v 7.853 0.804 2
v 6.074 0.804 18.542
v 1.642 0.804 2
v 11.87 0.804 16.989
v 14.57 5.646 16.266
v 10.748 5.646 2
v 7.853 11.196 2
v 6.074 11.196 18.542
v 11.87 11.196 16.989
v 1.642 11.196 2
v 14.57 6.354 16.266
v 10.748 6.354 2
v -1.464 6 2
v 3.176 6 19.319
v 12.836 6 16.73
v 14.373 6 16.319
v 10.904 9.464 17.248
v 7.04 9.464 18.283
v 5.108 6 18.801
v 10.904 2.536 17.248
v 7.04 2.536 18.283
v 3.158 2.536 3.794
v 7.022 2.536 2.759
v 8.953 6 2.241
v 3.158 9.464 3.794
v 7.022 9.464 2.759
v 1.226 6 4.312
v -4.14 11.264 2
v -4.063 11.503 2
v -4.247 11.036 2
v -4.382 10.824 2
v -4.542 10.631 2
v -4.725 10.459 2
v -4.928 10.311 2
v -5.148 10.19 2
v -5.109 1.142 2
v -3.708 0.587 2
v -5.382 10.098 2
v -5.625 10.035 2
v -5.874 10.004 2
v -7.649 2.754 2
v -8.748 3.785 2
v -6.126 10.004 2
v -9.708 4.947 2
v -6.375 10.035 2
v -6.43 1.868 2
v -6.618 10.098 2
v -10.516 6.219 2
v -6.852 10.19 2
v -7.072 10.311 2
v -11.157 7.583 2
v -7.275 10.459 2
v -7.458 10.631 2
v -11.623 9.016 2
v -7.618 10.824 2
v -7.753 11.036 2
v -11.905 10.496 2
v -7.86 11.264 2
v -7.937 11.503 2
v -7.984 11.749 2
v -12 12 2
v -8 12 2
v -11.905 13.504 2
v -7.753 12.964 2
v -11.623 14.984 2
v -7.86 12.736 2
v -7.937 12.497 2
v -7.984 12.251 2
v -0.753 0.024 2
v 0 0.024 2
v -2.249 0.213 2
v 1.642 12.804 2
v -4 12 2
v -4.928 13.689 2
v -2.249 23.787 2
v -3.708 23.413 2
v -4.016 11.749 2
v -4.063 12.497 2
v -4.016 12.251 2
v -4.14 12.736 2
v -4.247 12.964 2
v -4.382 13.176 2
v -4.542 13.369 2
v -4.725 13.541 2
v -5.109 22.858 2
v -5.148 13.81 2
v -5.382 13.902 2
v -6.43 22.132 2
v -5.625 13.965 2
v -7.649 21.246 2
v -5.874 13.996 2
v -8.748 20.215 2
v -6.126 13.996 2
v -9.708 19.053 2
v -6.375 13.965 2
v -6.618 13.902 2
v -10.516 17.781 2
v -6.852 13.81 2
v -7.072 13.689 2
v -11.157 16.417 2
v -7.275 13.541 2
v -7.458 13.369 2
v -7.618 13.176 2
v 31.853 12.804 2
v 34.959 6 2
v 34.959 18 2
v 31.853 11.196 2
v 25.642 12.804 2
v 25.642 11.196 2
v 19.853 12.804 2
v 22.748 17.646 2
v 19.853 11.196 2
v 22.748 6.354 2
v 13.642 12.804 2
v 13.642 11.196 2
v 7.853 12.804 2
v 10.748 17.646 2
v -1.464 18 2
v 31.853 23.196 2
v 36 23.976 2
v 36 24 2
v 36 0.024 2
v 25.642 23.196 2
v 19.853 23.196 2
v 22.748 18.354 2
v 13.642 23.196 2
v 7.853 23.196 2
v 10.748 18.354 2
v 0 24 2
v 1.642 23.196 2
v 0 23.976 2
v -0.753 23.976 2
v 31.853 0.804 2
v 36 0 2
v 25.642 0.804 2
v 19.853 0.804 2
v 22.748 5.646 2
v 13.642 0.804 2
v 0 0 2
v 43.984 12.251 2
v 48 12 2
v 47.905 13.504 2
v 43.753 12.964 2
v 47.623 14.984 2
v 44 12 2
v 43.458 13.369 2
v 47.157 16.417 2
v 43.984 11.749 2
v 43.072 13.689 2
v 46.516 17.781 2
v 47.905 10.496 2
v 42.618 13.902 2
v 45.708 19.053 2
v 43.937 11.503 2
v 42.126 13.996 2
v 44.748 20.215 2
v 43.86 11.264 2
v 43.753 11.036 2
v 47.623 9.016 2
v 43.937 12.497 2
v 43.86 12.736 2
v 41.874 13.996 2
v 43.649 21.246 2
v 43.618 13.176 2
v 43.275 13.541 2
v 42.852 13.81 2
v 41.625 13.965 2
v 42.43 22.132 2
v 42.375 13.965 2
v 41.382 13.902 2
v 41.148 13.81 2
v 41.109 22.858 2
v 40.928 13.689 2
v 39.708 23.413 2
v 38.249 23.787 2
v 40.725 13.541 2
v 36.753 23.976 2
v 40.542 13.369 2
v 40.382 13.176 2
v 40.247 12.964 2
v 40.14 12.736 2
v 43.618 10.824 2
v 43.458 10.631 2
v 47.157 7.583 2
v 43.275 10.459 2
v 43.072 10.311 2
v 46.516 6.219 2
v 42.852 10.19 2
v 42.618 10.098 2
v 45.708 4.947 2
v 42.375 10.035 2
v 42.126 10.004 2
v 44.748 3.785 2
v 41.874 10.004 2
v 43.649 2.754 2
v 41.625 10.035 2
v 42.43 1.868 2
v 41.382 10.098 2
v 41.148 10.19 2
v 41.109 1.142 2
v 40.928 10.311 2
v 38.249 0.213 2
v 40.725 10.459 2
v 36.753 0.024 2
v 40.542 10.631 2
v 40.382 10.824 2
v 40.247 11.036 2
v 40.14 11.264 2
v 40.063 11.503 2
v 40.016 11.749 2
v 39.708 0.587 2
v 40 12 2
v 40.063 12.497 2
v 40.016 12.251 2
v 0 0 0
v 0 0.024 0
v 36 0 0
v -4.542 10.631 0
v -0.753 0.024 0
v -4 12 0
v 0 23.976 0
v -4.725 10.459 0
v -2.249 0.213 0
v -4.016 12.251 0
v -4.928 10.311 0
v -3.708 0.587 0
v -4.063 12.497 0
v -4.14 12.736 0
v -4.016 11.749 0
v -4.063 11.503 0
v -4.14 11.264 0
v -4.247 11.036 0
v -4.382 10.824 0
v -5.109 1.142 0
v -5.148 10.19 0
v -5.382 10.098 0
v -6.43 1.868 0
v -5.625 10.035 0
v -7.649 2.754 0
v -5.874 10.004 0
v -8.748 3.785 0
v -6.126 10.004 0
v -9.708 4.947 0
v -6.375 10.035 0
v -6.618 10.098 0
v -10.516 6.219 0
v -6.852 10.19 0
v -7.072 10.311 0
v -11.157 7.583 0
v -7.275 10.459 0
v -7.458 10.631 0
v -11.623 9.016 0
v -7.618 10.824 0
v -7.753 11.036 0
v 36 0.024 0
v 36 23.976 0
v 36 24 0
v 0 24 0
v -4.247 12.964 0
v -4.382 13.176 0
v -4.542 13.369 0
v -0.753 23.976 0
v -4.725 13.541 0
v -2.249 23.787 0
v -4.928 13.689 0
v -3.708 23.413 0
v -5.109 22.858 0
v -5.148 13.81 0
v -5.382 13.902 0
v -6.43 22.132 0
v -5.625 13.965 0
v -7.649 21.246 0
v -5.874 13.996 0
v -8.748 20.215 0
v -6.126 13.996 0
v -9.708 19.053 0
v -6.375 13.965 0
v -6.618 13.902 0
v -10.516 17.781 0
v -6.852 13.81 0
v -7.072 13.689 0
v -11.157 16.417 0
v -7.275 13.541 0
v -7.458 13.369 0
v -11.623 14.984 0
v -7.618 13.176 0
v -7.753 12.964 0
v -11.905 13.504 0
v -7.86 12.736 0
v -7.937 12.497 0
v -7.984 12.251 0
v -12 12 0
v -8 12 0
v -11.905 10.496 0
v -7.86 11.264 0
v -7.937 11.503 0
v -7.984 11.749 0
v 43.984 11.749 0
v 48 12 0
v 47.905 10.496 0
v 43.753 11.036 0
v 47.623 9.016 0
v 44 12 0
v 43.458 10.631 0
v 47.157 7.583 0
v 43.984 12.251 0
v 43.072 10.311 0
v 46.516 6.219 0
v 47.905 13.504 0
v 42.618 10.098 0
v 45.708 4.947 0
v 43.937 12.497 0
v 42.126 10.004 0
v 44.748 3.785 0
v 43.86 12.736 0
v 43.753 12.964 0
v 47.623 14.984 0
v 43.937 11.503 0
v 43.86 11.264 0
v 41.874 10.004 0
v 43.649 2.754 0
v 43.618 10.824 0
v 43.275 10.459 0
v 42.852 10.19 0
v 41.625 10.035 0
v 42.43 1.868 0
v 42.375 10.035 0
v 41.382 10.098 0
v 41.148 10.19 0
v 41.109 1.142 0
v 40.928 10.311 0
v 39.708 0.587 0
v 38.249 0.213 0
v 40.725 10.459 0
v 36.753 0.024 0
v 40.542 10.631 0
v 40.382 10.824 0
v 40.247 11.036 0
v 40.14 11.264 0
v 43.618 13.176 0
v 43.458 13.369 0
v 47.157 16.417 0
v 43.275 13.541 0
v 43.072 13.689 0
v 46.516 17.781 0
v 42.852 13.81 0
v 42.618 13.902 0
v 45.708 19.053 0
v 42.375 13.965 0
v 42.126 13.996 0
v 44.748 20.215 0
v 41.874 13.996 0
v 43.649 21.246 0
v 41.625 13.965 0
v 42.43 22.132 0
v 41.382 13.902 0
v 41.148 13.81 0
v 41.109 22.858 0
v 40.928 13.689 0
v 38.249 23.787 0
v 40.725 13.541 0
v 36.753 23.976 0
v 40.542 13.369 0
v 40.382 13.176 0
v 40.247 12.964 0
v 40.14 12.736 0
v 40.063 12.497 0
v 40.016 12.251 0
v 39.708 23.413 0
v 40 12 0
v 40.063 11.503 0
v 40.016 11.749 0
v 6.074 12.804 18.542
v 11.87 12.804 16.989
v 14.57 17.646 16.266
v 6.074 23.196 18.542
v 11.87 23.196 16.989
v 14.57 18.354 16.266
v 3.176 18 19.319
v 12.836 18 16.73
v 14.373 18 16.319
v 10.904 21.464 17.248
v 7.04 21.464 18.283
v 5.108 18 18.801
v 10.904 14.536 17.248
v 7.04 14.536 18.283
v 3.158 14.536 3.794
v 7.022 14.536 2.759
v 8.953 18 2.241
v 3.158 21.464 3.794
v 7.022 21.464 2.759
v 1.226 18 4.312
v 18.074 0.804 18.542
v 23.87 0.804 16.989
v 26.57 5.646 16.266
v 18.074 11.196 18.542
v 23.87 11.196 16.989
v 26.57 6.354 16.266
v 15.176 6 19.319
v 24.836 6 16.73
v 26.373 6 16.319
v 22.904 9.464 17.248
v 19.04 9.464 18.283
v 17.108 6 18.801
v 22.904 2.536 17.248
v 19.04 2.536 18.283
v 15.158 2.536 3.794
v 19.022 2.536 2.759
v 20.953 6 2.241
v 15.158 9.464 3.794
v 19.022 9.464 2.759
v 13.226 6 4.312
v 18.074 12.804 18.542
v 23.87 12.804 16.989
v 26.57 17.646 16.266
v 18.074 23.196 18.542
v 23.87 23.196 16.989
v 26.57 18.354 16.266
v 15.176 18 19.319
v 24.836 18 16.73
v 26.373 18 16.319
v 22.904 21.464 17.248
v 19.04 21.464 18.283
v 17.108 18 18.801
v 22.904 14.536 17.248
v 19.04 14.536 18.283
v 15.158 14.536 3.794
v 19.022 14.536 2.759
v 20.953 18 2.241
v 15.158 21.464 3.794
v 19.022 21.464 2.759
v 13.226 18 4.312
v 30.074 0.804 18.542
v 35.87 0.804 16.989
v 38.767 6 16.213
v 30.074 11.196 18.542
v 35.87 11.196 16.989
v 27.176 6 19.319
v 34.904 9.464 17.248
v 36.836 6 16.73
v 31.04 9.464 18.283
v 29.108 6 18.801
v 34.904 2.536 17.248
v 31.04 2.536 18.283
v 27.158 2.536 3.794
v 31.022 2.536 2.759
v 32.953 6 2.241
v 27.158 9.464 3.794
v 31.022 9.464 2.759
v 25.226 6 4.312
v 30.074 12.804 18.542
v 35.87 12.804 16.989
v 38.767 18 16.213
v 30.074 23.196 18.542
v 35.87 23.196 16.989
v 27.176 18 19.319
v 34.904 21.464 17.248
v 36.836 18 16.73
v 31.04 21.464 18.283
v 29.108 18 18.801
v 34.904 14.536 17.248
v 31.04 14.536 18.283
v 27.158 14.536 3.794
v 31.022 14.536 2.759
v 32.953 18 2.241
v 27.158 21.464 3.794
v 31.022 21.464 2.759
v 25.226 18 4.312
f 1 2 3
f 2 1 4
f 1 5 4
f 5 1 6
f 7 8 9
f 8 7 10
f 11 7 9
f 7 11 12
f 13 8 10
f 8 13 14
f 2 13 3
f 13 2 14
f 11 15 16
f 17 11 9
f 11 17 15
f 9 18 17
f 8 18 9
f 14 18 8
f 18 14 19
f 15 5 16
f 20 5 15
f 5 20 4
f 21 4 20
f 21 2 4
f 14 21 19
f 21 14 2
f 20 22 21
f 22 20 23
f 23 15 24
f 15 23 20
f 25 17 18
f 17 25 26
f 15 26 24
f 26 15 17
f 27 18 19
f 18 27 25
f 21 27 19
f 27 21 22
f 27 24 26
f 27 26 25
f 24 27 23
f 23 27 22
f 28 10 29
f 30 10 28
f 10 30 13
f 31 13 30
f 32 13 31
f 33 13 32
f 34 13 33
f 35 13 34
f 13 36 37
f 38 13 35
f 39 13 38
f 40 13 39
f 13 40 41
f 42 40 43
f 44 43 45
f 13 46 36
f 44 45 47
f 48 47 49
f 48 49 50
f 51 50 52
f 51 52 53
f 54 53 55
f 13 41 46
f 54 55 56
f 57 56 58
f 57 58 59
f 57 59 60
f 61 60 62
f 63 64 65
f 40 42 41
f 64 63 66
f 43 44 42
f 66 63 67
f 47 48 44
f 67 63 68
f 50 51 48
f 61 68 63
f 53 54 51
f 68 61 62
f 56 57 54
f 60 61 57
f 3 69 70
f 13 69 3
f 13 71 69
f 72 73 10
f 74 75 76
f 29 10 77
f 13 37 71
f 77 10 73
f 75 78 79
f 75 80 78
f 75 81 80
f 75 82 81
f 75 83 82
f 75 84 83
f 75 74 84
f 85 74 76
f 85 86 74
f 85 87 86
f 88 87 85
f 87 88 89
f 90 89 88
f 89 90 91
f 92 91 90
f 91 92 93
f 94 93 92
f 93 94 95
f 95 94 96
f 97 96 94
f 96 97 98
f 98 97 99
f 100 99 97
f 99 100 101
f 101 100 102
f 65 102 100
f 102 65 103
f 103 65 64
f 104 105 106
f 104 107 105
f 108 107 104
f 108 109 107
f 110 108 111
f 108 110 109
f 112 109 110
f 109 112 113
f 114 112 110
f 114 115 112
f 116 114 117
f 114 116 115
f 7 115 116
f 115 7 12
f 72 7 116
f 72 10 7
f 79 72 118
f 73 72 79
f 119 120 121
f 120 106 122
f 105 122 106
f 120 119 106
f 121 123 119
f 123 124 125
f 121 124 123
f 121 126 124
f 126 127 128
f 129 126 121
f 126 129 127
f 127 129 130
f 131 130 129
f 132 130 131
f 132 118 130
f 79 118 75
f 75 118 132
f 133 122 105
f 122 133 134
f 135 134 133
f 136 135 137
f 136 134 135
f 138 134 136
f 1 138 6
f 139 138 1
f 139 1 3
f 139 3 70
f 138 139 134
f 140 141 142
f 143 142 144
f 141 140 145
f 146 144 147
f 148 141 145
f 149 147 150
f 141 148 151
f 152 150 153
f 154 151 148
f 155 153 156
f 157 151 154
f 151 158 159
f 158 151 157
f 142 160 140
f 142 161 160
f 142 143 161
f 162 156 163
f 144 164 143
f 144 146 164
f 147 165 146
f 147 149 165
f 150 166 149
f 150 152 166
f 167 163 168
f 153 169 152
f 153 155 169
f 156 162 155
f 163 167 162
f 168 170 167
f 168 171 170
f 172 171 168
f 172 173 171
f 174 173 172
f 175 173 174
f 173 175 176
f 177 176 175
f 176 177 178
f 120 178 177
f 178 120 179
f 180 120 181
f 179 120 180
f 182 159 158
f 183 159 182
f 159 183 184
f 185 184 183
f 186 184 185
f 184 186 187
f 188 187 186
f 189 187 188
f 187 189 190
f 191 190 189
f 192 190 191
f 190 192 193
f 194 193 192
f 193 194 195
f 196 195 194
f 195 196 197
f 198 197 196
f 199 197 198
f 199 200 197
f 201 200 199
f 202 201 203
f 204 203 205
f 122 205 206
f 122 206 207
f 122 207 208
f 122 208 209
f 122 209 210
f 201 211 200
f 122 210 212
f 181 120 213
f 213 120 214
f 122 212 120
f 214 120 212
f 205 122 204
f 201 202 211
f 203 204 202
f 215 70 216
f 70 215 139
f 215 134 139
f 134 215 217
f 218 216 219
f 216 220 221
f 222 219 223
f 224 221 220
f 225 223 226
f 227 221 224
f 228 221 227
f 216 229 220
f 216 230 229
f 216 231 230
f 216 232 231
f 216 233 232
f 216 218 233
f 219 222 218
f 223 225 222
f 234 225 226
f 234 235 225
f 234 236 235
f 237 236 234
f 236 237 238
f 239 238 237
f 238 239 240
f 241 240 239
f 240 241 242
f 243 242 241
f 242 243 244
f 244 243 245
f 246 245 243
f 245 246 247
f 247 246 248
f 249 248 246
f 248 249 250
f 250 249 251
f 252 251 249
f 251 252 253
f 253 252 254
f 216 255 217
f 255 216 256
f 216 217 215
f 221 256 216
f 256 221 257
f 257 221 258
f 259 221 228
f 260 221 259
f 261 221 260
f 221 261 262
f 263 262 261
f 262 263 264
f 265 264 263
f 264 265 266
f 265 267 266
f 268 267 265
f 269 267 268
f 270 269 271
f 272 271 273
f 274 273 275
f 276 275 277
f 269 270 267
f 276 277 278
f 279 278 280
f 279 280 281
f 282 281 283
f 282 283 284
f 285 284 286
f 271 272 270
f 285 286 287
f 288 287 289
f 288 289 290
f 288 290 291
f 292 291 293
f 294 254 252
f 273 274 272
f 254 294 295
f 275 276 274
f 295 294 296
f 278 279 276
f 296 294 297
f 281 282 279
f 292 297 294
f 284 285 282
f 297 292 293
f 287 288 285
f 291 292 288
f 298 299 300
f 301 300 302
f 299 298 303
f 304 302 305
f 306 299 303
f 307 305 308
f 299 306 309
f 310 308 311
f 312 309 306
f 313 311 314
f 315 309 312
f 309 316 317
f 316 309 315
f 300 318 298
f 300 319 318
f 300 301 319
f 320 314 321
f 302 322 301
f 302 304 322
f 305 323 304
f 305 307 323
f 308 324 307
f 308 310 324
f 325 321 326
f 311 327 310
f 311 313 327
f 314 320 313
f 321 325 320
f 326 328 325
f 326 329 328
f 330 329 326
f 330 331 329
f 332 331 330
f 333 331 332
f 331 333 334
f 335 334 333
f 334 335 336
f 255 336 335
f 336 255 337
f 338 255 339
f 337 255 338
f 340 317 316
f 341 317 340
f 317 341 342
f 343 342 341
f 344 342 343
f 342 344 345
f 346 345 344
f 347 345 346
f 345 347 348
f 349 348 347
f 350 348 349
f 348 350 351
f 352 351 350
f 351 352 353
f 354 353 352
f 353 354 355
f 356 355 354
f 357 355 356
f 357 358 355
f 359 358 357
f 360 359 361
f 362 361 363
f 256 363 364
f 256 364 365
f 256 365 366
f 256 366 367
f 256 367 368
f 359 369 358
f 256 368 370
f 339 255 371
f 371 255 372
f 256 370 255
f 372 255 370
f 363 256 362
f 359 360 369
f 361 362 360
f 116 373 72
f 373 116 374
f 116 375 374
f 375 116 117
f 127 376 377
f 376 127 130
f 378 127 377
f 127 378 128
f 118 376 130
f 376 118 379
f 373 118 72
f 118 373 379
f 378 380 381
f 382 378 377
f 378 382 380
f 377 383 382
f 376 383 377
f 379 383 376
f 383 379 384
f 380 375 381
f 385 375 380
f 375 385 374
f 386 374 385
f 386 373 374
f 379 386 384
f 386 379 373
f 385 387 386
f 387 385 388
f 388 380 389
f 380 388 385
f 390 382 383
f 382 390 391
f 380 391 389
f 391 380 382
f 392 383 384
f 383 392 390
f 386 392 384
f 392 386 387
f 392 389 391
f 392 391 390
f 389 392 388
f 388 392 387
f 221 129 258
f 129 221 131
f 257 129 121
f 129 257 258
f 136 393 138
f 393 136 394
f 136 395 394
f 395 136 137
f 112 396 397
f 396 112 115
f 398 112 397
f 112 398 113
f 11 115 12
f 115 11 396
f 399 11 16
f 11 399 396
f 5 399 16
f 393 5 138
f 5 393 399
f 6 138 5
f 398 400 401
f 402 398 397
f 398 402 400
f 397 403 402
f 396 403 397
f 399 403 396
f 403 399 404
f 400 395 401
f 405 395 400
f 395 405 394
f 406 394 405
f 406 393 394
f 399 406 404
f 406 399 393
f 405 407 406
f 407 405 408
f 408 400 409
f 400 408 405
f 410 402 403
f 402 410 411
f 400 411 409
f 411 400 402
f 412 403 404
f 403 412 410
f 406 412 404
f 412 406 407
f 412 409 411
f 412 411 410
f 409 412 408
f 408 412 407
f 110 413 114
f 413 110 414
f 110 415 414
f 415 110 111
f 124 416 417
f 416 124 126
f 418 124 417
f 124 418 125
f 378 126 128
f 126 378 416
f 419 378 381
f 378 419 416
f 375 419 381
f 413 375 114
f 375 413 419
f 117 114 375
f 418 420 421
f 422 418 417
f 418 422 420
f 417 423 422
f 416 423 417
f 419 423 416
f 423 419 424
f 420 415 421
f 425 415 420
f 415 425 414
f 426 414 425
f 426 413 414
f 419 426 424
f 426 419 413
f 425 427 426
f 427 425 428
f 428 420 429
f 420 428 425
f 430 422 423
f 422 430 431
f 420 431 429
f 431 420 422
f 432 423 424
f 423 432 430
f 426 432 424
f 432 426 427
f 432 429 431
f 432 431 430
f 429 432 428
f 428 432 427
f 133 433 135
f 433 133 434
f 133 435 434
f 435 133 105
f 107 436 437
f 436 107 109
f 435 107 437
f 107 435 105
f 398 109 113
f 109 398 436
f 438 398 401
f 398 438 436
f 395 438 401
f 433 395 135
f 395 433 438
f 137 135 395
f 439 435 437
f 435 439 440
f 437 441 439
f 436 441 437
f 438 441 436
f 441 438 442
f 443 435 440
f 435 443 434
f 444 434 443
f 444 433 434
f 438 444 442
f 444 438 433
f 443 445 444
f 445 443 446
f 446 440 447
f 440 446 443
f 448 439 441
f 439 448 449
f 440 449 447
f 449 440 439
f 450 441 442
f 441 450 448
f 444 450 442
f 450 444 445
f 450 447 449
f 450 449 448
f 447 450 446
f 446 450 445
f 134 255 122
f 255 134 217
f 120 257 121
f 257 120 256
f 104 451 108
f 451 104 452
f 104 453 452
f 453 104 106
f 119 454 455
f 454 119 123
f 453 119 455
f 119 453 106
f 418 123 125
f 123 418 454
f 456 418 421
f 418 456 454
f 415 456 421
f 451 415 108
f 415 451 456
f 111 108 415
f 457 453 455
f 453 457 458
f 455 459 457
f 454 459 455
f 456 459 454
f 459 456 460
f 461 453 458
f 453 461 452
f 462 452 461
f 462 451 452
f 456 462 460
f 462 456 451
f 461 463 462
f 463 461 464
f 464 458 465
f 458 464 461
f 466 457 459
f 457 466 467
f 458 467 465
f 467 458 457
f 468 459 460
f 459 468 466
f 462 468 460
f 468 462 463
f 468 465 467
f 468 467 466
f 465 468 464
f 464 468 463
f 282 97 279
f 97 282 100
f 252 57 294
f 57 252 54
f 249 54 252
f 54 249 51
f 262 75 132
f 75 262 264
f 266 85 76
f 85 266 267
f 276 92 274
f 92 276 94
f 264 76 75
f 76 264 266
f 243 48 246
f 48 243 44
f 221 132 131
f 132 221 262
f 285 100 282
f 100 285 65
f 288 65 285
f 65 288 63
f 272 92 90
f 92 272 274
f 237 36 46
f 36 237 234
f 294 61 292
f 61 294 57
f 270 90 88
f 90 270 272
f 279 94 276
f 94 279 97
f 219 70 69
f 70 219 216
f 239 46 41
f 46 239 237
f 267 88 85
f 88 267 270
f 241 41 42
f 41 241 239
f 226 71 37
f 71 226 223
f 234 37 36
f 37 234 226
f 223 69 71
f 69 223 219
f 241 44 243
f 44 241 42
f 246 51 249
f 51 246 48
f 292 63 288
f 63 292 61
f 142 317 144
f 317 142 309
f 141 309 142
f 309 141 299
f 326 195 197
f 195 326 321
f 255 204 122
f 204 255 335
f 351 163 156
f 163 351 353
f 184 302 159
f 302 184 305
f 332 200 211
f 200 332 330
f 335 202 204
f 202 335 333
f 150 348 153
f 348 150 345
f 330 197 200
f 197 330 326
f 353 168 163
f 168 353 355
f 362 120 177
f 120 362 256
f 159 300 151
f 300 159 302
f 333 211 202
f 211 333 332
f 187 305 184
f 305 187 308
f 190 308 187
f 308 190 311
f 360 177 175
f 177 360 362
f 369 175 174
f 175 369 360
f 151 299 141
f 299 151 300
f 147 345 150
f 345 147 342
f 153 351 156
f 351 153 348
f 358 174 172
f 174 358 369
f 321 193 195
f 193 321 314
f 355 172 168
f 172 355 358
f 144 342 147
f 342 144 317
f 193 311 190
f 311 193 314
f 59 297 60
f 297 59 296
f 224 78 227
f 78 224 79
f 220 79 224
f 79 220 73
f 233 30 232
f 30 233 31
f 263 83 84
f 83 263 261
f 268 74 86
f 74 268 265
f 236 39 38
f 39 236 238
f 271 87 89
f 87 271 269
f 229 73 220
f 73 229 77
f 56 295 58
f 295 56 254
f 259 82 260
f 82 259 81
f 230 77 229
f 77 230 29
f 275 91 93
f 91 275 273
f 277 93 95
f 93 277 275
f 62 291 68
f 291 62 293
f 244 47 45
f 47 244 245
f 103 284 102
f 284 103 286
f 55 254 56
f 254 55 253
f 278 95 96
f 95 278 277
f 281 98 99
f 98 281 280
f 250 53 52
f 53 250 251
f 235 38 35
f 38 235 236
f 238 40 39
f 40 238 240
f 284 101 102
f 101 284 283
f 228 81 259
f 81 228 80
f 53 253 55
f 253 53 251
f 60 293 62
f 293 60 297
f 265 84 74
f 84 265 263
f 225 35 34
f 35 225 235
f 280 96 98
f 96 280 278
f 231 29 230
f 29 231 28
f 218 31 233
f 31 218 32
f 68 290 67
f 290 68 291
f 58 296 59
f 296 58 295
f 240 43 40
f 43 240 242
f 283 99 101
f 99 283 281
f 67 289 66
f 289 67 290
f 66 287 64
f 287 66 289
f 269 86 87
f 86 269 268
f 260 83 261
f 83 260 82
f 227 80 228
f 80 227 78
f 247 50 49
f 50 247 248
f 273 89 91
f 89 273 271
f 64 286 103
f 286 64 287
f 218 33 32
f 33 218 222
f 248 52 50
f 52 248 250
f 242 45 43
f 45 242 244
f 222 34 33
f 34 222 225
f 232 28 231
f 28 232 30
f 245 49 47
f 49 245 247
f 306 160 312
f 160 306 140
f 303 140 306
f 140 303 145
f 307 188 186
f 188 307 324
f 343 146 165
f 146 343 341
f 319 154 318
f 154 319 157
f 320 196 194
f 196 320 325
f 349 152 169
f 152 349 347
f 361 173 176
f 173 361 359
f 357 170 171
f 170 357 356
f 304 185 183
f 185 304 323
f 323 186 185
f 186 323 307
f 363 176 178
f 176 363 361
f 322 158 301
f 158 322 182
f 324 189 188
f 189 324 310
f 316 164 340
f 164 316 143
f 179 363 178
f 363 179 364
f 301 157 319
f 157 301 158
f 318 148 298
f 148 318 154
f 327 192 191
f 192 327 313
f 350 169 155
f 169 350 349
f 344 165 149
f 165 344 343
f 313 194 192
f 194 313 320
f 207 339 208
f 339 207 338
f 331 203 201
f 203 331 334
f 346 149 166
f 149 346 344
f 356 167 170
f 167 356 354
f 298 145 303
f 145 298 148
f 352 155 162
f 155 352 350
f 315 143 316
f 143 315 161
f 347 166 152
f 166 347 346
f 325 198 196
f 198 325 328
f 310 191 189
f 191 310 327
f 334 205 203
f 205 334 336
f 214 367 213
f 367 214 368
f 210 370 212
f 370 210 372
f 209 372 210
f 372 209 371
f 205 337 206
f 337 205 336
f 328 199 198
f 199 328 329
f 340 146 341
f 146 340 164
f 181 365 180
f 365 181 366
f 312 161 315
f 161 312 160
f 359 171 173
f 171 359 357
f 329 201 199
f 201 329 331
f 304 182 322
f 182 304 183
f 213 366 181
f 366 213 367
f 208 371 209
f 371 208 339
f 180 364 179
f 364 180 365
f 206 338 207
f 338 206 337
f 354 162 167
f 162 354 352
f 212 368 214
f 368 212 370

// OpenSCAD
d = 8;
dd = 2;
wall = 2 * 2;
h = 15;

module unit(){
    
    difference(){

        union(){
            translate( [ -2, 0, 0 ] )
                rotate( 15, [ 0, 1, 0 ] )
                    translate( [ d / 2 + dd, d / 2 + dd, 5 ] )
                        difference(){       
                            translate( [ 0, 0, -10 ] )
                                cylinder( h = h + 10, d = d + wall, $fn = 6 );
                            cylinder( h = h + 1, d = d, $fn = 6 );
                        }
        
            translate( [ 0, 0, -1 ] )
                cube( [ d + 2 * dd, d + 2 * dd, 2 + 1 ] );

        }
        translate( [ -25, -25, -100 ] )
            cube( [ d + 2 * dd + 50, d + 50 * dd + 2, 100 ] );
    }
}

translate( [ 0 * ( d + 2 * dd ), 0, 0 ] )
{
    unit();
        translate( [ 0, d + 2 * dd, 0 ] )
            unit();

}translate( [ 1 * ( d + 2 * dd ), 0, 0 ] )
{
    unit();
        translate( [ 0, d + 2 * dd, 0 ] )
            unit();

}
translate( [ 2 * ( d + 2 * dd ), 0, 0 ] )
{
    unit();
        translate( [ 0, d + 2 * dd, 0 ] )
            unit();

}

difference(){
    union(){
        translate( [ 0, ( d + 2 * dd ), -1 ] )
            cylinder( d = 2 * ( d + 2 * dd ), h = 2 + 1, $fn = 50 );
        translate( [ 3 * ( d + 2 * dd ), ( d + 2 * dd ), -1 ] )
            cylinder( d = 2 * ( d + 2 * dd ), h = 2 + 1, $fn = 50 );
    }
    
    translate( [ -100, -100, -50 ] )
        cube( [ 200, 200, 50 ] );        

    translate( [ -6, ( d + 2 * dd ), -1 ] )
        cylinder( d = 4, h = 2 + 2, $fn = 50 );
    translate( [ 3 * ( d + 2 * dd )  + 6, ( d + 2 * dd ), -1 ] )
        cylinder( d = 4, h = 2 + 2, $fn = 50 );
}
